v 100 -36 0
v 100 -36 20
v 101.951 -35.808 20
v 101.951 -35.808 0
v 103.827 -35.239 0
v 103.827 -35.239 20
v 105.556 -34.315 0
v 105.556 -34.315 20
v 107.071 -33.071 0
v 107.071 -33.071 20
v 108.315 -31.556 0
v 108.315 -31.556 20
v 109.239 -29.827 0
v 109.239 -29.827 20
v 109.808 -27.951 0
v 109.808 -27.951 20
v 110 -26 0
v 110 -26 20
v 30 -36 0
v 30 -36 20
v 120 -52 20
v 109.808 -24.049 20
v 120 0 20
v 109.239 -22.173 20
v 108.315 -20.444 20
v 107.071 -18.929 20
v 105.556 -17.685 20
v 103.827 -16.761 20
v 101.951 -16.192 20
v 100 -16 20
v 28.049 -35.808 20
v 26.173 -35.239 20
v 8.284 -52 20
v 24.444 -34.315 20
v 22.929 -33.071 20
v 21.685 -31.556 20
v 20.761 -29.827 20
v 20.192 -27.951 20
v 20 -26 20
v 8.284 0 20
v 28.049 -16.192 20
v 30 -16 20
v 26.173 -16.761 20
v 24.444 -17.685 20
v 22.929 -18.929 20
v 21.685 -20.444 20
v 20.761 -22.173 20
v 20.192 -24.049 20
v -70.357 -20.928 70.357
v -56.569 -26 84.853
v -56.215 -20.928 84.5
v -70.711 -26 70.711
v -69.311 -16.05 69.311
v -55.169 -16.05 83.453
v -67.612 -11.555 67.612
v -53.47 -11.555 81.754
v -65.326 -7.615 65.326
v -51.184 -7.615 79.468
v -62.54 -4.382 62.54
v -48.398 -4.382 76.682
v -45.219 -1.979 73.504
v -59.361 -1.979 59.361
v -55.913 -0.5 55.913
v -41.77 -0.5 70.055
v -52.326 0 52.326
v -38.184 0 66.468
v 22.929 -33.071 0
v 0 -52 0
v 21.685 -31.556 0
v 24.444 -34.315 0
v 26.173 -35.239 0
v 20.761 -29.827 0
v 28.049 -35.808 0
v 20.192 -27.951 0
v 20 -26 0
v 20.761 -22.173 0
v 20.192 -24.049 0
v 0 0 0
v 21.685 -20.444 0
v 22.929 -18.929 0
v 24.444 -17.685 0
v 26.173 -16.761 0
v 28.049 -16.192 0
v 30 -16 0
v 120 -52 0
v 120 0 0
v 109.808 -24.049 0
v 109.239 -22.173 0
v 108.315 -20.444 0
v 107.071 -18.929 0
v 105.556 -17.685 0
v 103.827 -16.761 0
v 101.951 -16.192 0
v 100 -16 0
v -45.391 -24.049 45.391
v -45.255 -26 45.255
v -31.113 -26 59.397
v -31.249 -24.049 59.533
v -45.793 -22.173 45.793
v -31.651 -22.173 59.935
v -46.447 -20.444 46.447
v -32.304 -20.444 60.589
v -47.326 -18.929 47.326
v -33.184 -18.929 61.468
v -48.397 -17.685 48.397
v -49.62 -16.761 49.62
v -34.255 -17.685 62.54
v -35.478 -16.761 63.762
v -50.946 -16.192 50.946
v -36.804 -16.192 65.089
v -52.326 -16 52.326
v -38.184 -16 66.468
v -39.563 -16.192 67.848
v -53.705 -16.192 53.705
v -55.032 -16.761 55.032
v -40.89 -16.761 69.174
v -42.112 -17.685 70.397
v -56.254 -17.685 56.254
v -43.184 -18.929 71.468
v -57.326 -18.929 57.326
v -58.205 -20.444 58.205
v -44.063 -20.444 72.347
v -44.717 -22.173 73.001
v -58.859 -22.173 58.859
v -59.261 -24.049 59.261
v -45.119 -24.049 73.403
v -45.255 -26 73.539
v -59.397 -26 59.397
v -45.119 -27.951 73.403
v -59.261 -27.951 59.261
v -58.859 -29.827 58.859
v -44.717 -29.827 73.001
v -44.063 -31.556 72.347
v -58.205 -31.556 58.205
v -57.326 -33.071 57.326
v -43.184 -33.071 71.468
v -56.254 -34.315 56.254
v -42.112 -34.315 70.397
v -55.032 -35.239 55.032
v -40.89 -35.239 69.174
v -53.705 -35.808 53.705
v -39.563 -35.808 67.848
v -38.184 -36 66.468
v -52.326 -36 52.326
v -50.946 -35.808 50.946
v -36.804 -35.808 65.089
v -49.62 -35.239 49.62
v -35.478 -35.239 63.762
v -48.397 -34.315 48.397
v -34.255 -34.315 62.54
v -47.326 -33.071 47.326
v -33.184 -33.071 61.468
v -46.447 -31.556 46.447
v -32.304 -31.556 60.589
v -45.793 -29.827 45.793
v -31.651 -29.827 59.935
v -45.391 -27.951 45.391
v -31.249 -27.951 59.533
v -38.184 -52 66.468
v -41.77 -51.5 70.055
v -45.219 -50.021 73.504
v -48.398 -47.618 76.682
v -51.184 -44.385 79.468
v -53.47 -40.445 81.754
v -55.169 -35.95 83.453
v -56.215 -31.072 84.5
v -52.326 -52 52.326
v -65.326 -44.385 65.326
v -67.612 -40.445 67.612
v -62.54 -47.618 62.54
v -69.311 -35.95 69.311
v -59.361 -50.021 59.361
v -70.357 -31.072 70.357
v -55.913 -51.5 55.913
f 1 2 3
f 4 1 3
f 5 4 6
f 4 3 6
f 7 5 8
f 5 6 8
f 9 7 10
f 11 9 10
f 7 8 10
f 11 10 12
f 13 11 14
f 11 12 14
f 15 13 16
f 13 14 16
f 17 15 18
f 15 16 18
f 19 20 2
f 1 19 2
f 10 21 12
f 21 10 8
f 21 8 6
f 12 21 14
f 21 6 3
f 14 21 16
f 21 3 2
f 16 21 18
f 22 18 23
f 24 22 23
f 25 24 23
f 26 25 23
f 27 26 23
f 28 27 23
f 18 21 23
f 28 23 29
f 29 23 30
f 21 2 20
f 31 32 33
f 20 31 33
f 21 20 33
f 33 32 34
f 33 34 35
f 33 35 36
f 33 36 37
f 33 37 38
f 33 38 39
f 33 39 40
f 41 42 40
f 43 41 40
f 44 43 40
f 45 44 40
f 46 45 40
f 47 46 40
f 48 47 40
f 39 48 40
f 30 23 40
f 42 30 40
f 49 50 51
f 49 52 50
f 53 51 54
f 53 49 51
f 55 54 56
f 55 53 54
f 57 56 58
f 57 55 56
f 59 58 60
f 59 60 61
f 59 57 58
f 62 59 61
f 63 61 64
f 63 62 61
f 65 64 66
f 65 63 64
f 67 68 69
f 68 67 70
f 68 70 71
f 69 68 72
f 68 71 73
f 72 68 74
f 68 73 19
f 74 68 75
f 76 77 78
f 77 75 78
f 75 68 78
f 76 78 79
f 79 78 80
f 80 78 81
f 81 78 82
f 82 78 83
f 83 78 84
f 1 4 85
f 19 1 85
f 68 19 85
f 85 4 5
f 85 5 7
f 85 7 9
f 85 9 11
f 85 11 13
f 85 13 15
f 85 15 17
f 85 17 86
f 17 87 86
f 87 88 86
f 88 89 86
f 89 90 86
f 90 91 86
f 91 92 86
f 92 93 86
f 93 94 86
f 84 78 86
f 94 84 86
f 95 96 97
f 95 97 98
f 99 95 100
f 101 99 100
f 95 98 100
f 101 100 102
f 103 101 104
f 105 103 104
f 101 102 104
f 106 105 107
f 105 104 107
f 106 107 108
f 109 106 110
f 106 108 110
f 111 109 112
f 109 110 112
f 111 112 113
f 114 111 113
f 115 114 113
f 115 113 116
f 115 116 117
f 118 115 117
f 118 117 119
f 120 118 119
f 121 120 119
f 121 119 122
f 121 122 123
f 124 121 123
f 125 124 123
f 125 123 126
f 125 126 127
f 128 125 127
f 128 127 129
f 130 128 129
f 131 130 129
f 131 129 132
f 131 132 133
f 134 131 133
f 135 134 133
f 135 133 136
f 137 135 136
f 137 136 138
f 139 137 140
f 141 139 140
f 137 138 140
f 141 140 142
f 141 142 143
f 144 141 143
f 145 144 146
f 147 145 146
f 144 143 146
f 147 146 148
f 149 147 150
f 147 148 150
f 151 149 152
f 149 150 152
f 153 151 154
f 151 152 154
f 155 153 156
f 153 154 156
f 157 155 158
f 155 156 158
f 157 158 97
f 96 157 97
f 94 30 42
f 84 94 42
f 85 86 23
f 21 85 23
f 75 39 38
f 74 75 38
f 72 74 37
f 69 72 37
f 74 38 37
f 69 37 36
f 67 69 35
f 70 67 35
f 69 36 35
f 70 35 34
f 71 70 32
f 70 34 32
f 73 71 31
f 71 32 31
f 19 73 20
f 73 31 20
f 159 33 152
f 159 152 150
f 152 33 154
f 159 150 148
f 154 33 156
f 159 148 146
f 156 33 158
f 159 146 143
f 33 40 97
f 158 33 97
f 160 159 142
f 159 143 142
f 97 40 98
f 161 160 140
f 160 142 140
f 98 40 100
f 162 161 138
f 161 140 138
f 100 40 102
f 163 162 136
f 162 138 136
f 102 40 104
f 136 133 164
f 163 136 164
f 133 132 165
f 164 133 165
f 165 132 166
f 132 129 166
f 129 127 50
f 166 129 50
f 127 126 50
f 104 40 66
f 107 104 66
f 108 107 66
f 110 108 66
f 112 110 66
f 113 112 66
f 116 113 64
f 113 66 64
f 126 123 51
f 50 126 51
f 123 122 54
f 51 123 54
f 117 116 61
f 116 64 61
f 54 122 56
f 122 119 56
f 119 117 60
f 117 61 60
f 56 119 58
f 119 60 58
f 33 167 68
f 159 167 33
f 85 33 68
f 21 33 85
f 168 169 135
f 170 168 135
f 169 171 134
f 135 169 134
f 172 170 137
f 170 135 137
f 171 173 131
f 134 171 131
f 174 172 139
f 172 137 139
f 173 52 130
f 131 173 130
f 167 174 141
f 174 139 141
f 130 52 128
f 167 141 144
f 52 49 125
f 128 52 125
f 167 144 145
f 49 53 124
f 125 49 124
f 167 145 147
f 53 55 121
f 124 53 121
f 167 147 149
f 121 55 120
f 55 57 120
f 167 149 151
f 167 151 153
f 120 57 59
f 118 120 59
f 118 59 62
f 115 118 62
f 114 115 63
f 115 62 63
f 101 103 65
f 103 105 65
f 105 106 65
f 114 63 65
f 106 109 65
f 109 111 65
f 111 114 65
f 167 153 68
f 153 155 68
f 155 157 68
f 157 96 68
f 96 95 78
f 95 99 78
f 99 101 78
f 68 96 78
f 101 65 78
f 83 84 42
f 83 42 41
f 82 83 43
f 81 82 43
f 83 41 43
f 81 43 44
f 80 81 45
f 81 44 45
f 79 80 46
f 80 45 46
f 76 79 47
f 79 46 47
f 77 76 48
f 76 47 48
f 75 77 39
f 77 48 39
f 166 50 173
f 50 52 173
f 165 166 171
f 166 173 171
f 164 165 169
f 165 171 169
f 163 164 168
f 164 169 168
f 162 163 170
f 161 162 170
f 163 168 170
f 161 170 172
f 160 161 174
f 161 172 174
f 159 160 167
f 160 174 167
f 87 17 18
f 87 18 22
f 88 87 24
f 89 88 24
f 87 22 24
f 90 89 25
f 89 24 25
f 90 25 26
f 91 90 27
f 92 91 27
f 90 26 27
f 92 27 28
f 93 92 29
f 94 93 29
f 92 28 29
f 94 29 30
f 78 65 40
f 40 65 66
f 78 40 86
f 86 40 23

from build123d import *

# Parameters (mm, degrees)
F0_W     = 90
F0_H     = 20
F0_W_2   = 10
F1_DEPTH = 52
F2_R     = 25.99999
F4_DEPTH = 25
F6_DEPTH = 25


# Not quite as in the source:
# - a fillet or chamfer is up to 0.001 mm smaller than in the source, because OpenCascade refuses the exact size


with BuildPart() as f1:
    # F0 (on Front) → F1 (new body)
    with BuildSketch(Plane.XZ):
        Polygon((-45.2548339959, 45.2548339959), (0, 0), (20, 0), (20, 20), (8.2842712475, 20), (-31.1126983722, 59.3969696197), align=None)
        with Locations((65, 10)):
            Rectangle(F0_W, F0_H)
        Polygon((-59.3969696197, 59.3969696197), (-45.2548339959, 45.2548339959), (-31.1126983722, 59.3969696197), (-45.2548339959, 73.5391052434), align=None)
        with Locations((115, 10)):
            Rectangle(F0_W_2, F0_H)
        Polygon((-70.7106781187, 70.7106781187), (-59.3969696197, 59.3969696197), (-45.2548339959, 73.5391052434), (-56.5685424949, 84.8528137424), align=None)
    extrude(amount=F1_DEPTH)

    # F2 (radius 26 in the source; OpenCascade refuses exactly that, so slightly less here)
    f2_edges = [f1.edges().sort_by_distance(p)[0] for p in [
        (-63.63961, 0, 77.781746),
        (-63.63961, -52, 77.781746),
    ]]
    fillet(f2_edges, radius=F2_R)

    # F3 (on face) → F4 (cut)
    with BuildSketch(Plane(origin=(14.1421356237, 0, 14.1421356237), x_dir=(0.7071067812, 0, -0.7071067812), z_dir=(0.7071067812, 0, 0.7071067812))):
        with BuildLine():
            ThreePointArc((-84, -26), (-74, -36), (-64, -26))
            ThreePointArc((-64, -26), (-74, -16), (-84, -26))
        make_face()
    extrude(amount=-F4_DEPTH, mode=Mode.SUBTRACT)

    # F5 (on face) → F6 (cut)
    with BuildSketch(Plane.XY.offset(20)):
        with BuildLine():
            Line((100, -16), (30, -16))
            ThreePointArc((30, -16), (22.9289321881, -18.9289321881), (20, -26))
            ThreePointArc((20, -26), (22.9289321881, -33.0710678119), (30, -36))
            Line((30, -36), (100, -36))
            ThreePointArc((100, -36), (107.0710678119, -33.0710678119), (110, -26))
            ThreePointArc((110, -26), (107.0710678119, -18.9289321881), (100, -16))
        make_face()
    extrude(amount=-F6_DEPTH, mode=Mode.SUBTRACT)


solid = f1.part
